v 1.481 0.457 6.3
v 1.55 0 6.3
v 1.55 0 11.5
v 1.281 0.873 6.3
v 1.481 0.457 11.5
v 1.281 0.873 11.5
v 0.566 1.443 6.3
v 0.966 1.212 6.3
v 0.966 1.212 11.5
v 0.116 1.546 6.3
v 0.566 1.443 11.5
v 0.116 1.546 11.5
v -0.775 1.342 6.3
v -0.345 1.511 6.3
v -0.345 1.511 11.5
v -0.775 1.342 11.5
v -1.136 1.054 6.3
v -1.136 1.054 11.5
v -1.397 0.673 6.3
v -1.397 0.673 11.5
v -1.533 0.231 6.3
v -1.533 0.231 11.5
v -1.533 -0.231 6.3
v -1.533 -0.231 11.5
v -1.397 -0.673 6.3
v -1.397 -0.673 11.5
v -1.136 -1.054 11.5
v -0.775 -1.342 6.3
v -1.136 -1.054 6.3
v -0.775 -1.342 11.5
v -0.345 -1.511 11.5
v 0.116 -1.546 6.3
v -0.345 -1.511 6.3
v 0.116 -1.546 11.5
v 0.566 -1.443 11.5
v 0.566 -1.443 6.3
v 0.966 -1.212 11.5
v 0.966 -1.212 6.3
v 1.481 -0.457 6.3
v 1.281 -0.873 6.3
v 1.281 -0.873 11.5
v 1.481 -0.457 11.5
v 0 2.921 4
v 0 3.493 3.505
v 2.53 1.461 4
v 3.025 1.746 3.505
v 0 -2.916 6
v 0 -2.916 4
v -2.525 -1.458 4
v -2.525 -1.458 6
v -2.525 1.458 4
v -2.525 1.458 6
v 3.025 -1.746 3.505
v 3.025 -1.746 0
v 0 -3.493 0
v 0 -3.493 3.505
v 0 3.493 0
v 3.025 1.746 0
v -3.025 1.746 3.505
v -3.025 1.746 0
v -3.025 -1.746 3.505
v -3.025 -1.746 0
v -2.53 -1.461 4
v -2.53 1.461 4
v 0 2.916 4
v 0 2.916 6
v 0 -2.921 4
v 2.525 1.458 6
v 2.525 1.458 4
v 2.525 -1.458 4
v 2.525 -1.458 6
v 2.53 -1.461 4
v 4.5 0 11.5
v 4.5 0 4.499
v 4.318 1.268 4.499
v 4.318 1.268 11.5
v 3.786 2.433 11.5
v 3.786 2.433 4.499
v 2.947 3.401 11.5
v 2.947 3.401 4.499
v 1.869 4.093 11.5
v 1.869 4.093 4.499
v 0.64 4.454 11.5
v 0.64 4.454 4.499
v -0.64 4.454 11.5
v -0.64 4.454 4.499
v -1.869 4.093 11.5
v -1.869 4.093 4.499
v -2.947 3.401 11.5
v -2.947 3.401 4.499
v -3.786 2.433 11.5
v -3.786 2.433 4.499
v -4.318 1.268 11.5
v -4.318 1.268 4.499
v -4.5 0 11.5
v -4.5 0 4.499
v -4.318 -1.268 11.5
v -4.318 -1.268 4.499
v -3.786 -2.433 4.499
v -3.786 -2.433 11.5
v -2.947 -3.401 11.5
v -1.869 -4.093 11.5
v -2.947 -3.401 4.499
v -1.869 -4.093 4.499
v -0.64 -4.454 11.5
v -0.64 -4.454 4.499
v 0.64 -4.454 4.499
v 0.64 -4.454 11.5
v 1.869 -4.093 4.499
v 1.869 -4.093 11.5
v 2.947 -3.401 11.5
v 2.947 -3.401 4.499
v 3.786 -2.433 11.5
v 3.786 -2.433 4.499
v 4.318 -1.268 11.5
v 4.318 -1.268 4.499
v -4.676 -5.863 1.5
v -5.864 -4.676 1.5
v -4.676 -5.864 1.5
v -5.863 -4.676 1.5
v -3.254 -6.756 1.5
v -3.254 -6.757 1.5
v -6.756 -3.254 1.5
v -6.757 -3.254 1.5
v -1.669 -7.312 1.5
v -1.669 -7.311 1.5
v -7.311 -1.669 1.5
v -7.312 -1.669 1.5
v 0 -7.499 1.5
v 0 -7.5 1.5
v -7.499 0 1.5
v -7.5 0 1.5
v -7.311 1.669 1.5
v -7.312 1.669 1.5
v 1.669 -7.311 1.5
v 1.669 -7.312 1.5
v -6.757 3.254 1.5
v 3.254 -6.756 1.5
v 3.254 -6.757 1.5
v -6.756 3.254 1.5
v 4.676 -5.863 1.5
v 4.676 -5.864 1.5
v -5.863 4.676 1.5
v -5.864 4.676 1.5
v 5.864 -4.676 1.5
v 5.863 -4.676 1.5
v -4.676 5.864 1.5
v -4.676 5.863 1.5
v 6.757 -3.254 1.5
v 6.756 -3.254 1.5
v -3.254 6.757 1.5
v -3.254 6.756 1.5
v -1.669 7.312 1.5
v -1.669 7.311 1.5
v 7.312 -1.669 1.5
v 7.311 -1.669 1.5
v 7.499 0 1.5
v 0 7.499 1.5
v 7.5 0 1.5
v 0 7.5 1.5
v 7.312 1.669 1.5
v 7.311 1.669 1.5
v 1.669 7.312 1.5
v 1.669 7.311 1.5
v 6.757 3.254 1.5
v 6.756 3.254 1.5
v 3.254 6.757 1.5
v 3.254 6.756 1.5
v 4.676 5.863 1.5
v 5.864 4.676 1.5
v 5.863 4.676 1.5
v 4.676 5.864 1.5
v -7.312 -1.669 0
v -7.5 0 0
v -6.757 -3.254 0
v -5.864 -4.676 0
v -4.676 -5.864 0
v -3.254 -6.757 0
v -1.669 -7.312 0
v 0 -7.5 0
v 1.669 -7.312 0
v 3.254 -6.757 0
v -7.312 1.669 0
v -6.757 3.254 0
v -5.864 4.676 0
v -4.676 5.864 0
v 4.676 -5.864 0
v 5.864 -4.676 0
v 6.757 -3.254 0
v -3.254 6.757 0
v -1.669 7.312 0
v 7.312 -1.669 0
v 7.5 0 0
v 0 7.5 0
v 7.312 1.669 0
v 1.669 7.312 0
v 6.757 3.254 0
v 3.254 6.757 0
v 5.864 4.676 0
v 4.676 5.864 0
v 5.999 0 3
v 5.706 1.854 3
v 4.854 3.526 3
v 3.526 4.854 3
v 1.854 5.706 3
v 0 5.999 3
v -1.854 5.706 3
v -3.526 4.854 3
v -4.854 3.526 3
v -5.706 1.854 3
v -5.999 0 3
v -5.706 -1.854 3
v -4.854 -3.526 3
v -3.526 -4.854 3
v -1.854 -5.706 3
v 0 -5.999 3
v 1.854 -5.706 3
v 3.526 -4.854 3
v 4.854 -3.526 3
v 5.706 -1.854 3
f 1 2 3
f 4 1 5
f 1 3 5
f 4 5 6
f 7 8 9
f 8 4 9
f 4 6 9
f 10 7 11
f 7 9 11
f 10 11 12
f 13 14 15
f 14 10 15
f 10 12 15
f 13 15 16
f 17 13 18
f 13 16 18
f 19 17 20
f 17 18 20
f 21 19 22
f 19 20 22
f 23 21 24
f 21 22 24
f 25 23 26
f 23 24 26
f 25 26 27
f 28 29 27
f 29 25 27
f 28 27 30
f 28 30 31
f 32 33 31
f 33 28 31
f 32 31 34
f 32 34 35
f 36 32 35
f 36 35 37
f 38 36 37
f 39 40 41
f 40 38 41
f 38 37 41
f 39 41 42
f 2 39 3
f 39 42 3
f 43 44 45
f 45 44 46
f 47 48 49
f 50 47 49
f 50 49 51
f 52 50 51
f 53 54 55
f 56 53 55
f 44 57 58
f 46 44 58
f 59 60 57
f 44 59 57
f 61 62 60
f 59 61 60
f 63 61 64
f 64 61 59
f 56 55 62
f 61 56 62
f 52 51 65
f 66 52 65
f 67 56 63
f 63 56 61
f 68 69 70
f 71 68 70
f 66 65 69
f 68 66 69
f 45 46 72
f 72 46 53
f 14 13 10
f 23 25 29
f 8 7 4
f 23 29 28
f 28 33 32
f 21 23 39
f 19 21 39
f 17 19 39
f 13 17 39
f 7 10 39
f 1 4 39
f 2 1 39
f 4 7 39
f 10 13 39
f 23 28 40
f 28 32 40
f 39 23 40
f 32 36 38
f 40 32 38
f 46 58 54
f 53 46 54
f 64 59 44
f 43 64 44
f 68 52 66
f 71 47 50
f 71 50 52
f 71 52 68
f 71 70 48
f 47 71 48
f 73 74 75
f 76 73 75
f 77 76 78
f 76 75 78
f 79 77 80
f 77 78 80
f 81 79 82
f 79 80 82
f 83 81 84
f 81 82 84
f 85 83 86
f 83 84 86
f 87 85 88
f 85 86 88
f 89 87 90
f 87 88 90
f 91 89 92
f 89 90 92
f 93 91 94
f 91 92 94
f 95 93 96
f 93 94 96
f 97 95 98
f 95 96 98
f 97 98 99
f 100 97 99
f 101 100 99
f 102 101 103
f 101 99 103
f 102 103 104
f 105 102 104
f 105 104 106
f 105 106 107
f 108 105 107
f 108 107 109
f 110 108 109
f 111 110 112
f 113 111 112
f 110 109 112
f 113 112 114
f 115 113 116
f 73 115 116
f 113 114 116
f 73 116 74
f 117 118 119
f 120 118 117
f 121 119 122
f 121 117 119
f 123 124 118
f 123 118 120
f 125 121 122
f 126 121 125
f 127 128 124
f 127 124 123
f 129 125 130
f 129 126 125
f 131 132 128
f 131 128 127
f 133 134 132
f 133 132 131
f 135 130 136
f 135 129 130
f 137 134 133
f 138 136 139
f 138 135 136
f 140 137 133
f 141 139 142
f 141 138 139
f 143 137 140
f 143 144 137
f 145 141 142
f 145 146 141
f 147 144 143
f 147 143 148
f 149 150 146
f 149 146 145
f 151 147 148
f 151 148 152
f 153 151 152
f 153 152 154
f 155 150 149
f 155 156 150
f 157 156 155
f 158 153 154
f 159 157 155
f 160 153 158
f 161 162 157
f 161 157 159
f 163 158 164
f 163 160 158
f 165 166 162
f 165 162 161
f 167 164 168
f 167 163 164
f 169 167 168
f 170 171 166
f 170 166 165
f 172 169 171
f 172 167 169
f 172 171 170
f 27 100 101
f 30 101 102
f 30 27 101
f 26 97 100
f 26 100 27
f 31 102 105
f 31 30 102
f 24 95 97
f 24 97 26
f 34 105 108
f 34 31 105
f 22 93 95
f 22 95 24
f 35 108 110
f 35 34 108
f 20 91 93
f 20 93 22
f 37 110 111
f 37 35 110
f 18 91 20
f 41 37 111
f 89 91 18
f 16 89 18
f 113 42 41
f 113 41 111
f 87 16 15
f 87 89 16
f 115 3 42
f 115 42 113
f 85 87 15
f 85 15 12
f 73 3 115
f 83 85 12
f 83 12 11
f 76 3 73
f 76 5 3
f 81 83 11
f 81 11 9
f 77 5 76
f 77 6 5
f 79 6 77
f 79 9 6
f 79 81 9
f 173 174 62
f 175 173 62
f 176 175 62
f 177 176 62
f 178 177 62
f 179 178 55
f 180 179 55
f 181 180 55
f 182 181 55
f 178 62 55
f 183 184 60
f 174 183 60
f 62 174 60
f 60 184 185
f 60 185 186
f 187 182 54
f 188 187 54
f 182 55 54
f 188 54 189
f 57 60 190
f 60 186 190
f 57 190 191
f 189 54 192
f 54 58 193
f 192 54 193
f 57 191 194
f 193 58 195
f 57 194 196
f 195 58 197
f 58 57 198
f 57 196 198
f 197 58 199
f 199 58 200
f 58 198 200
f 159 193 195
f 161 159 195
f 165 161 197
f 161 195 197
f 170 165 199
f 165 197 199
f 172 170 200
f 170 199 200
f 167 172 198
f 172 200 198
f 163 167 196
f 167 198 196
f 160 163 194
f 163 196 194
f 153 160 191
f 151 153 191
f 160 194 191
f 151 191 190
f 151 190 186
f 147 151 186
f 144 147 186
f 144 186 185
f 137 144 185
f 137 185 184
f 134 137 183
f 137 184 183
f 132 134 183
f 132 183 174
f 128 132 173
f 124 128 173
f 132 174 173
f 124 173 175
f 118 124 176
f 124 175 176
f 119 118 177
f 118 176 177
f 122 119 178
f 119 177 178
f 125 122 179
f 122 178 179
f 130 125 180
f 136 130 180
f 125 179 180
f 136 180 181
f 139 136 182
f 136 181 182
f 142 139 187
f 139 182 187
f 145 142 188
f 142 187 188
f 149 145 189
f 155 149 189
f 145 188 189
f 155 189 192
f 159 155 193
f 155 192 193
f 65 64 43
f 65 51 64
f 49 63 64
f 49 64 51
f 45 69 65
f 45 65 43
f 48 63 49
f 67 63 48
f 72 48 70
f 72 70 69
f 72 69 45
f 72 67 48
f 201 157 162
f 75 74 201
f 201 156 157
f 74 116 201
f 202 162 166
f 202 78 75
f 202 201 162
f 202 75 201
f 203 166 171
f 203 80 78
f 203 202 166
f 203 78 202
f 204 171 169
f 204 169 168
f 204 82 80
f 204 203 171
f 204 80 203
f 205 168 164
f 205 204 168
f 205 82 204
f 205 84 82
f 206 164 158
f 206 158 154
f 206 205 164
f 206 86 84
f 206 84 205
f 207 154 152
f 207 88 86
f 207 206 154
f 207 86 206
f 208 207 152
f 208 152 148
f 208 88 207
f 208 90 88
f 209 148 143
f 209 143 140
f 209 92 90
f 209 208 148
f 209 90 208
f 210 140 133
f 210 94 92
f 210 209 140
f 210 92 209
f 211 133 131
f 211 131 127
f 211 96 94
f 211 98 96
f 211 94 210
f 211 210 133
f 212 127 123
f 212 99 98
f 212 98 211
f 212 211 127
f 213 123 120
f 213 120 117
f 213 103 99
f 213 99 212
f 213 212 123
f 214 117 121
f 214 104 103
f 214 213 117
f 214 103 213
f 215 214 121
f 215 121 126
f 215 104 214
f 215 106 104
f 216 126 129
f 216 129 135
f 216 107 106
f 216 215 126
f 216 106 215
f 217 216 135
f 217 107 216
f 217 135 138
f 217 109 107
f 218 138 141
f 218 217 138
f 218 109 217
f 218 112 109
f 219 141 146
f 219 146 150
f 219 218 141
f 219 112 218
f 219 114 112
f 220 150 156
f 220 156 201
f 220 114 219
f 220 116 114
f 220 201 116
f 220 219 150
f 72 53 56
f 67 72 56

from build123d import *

# Parameters (mm, degrees)
SKETCH_R        = 7.5
PAD_DEPTH       = 1.5
SKETCH001_R     = 4.5
PAD001_DEPTH    = 10
POCKET_DEPTH    = 6
SKETCH003_R     = 1.55
POCKET001_DEPTH = 11.501
POCKET002_DEPTH = 4
CHAMFER_SIZE    = 2.999
SKETCH005_R     = 1.55
PAD002_DEPTH    = 0.3
CHAMFER001_SIZE = 0.495


with BuildPart() as part:
    # Sketch → Pad (new body)
    with BuildSketch(Plane.XY):
        Circle(SKETCH_R)
    extrude(amount=PAD_DEPTH)

    # Sketch001 → Pad001 (new body)
    with BuildSketch(Plane.XY.offset(1.5)):
        Circle(SKETCH001_R)
    extrude(amount=PAD001_DEPTH)

    # Sketch002 → Pocket (cut)
    with BuildSketch(Plane(origin=(0, 0, 0), x_dir=(1, 0, 0), z_dir=(0, 0, -1))):
        Polygon((2.525, 1.457809), (0, 2.915619), (-2.525, 1.457809), (-2.525, -1.457809), (0, -2.915619), (2.525, -1.457809), align=None)
    extrude(amount=-POCKET_DEPTH, mode=Mode.SUBTRACT)

    # Sketch003 → Pocket001 (cut, through all)
    with BuildSketch(Plane.XY.offset(11.5)):
        Circle(SKETCH003_R)
    extrude(amount=-POCKET001_DEPTH, mode=Mode.SUBTRACT)

    # Sketch004 → Pocket002 (cut)
    with BuildSketch(Plane(origin=(0, 0, 0), x_dir=(1, 0, 0), z_dir=(0, 0, -1))):
        Polygon((3.025, 1.746485), (0, 3.492969), (-3.025, 1.746485), (-3.025, -1.746485), (0, -3.492969), (3.025, -1.746485), align=None)
    extrude(amount=-POCKET002_DEPTH, mode=Mode.SUBTRACT)

    # Chamfer
    chamfer_edges = [part.edges().sort_by_distance(p)[0] for p in [
        (-4.5, 0, 1.5),
    ]]
    chamfer(chamfer_edges, length=CHAMFER_SIZE)

    # Sketch005 → Pad002 (new body)
    with BuildSketch(Plane(origin=(0, 0, 6), x_dir=(1, 0, 0), z_dir=(0, 0, -1))):
        Circle(SKETCH005_R)
    extrude(amount=-PAD002_DEPTH)

    # Chamfer001
    chamfer001_edges = [part.edges().sort_by_distance(p)[0] for p in [
        (3.025, 0, 4),
        (1.5125, -2.619727, 4),
        (1.5125, 2.619727, 4),
        (-1.5125, -2.619727, 4),
        (-3.025, 0, 4),
        (-1.5125, 2.619727, 4),
    ]]
    chamfer(chamfer001_edges, length=CHAMFER001_SIZE)


solid = part.part
